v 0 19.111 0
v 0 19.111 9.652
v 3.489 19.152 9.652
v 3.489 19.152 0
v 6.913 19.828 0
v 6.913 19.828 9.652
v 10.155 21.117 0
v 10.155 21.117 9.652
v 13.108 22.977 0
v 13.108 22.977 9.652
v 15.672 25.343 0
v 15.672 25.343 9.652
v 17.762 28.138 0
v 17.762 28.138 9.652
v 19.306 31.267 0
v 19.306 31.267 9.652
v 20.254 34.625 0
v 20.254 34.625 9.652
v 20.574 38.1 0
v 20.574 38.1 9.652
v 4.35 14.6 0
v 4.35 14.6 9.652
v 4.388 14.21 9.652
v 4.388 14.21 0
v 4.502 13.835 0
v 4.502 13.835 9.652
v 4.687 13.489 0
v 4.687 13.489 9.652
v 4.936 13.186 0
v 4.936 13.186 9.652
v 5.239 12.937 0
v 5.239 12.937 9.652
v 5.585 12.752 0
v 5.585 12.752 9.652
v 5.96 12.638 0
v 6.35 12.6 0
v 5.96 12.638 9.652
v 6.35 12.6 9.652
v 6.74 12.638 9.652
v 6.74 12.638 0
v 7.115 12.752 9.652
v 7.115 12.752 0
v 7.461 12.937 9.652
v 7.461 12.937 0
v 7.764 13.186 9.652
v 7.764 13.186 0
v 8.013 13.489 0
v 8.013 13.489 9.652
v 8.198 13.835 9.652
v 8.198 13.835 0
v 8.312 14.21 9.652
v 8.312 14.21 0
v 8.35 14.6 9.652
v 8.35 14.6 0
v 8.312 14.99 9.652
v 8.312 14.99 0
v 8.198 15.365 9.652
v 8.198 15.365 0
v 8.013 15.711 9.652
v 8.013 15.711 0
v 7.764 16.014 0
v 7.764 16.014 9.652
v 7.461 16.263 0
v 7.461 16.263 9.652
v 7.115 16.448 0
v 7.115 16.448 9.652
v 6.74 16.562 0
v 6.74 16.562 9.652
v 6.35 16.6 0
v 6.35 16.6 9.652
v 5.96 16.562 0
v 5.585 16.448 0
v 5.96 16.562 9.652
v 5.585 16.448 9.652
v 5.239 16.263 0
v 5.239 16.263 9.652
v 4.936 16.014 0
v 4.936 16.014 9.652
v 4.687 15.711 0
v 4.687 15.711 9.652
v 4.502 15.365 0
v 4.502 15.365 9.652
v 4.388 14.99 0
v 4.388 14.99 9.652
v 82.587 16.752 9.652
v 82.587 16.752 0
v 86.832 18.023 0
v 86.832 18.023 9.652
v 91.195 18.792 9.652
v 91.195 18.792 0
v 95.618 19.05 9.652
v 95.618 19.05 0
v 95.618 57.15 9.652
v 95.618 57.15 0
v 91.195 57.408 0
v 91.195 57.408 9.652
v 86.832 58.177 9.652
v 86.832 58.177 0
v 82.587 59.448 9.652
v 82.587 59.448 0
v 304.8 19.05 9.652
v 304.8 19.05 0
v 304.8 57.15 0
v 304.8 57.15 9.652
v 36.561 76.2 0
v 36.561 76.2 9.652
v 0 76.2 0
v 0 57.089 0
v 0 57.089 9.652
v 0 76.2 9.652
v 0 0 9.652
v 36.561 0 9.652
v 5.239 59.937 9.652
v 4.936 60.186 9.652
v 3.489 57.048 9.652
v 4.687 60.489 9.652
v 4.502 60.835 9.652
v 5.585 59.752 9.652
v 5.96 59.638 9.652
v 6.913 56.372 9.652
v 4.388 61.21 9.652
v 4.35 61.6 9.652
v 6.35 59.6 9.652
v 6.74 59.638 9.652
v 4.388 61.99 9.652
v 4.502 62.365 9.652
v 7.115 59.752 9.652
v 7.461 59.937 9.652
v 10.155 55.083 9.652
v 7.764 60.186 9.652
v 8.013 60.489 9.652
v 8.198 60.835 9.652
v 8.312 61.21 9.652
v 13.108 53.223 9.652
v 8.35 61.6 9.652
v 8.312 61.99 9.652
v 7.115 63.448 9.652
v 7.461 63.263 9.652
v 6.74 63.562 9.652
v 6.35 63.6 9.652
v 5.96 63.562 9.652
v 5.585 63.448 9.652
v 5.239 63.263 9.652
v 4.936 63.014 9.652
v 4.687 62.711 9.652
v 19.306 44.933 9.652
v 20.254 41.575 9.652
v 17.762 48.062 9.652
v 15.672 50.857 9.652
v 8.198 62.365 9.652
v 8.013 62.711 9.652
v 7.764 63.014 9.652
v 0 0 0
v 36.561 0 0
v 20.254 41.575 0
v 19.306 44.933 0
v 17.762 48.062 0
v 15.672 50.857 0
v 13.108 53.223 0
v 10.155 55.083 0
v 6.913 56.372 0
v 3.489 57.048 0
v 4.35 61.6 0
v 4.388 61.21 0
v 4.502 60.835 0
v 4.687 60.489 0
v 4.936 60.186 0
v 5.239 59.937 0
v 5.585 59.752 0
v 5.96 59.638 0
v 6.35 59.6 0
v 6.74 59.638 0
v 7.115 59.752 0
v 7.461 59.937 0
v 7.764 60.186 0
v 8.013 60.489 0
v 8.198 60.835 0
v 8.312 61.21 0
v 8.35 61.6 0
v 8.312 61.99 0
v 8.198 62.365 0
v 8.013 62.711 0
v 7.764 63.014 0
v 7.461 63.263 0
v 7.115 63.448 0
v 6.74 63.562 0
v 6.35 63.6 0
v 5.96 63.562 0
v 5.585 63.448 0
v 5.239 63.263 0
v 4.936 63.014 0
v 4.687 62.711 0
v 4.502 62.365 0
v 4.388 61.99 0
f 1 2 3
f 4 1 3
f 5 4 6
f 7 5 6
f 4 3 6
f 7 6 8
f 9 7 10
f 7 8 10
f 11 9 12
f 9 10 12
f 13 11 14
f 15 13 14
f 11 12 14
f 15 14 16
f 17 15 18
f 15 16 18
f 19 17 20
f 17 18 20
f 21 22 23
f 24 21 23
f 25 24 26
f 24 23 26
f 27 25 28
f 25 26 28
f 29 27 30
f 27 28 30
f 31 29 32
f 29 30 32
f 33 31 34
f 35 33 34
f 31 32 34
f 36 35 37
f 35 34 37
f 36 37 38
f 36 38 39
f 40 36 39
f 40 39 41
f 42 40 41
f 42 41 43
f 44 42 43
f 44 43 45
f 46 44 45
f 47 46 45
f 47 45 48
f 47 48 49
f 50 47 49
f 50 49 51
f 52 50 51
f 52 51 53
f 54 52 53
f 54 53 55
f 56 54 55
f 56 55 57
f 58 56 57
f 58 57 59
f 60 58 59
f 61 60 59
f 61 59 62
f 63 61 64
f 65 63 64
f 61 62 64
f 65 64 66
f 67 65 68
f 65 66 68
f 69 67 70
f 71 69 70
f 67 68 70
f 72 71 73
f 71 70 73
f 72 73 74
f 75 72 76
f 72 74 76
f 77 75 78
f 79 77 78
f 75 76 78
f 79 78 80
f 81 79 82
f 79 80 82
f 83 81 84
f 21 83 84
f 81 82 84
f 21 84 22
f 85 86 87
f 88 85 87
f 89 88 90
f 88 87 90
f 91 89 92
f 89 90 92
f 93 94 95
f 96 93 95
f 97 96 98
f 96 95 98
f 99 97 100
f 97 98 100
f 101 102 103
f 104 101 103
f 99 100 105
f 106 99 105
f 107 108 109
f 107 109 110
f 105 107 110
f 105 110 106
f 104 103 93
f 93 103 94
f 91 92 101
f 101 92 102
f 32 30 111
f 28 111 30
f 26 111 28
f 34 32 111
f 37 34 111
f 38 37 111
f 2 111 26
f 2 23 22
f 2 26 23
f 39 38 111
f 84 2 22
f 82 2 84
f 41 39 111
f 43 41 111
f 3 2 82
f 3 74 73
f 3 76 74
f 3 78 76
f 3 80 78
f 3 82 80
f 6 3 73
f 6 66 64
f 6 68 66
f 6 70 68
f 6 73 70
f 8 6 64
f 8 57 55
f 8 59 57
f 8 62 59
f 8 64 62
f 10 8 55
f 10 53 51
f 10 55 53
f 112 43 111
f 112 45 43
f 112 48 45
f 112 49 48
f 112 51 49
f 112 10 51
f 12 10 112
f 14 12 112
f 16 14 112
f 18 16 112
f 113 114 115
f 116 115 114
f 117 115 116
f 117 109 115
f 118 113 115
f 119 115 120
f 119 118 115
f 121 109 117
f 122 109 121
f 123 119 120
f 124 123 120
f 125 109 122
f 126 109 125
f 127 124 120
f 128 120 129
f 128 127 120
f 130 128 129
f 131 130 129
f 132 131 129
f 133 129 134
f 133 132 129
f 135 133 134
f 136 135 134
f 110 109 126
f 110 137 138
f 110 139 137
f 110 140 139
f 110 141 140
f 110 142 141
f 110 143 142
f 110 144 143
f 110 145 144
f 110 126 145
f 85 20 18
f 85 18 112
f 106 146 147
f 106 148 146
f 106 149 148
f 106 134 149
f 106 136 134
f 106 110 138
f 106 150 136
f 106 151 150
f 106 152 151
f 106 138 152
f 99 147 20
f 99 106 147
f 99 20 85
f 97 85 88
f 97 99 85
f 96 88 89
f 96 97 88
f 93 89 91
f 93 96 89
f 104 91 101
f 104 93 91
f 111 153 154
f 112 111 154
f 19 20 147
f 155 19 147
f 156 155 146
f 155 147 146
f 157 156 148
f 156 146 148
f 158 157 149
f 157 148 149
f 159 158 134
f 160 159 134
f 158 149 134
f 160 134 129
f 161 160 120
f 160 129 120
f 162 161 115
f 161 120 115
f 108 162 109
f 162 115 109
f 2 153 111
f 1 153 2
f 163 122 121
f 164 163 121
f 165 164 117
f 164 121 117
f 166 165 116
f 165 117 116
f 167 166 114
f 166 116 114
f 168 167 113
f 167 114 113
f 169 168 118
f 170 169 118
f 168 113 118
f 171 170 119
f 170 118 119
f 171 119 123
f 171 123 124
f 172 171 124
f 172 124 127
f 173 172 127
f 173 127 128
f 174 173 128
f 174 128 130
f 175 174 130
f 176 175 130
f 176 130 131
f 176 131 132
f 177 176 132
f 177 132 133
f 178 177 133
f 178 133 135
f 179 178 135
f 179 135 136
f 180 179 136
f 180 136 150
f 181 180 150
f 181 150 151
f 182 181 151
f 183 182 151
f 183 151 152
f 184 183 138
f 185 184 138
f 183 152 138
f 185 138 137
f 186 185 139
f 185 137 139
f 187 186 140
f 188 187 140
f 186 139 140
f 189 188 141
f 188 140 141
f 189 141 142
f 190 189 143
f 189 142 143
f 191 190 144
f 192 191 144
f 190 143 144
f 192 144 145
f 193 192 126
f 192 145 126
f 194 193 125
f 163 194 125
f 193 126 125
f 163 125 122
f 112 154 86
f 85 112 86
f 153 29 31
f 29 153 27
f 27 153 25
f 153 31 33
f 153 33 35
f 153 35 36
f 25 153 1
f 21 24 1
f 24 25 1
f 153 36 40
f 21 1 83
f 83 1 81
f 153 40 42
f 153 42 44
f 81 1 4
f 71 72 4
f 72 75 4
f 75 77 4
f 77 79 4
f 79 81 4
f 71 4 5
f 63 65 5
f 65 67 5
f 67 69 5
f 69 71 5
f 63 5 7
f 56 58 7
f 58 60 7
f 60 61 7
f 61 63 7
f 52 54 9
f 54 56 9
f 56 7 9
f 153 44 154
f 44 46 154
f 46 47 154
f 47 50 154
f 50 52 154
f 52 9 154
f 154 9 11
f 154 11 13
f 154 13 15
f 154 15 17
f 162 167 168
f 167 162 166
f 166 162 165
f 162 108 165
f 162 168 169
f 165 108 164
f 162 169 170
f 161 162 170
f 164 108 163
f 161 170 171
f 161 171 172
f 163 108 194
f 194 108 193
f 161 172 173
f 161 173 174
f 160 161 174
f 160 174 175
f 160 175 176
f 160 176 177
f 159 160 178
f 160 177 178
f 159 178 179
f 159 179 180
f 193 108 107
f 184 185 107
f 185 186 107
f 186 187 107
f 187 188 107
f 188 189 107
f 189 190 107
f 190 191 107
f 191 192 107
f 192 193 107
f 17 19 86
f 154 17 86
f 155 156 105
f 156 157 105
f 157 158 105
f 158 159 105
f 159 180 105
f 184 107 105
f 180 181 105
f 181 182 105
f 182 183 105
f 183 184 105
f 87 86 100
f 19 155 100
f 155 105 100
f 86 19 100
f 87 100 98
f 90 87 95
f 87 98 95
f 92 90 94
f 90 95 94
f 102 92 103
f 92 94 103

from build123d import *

# Parameters (mm, degrees)
F0_W     = 304.8
F0_H     = 76.2
F1_DEPTH = 9.652
F3_DEPTH = 9.653
F5_DEPTH = 25.4
F7_D     = 4


with BuildPart() as f1:
    # F0 (on Top) → F1 (new body)
    with BuildSketch(Plane.XY):
        with Locations((152.4, 38.1)):
            Rectangle(F0_W, F0_H)
    extrude(amount=F1_DEPTH)

    # F2 (on face) → F3 (cut, through all)
    with BuildSketch(Plane.XY.offset(9.652)):
        with BuildLine():
            ThreePointArc((0, 19.111058), (14.444339, 24.101166), (20.574, 38.1))
            ThreePointArc((20.574, 38.1), (14.444339, 52.098834), (0, 57.088942))
            Line((0, 57.088942), (0, 19.111058))
        make_face()
    extrude(amount=-F3_DEPTH, mode=Mode.SUBTRACT)

    # F4 (on face) → F5 (cut)
    with BuildSketch(Plane(origin=(0, 0, 0), x_dir=(1, 0, 0), z_dir=(0, 0, -1))):
        with BuildLine():
            Line((304.8, 0), (36.560555, 0))
            Line((36.560555, 0), (82.587091, -16.752289))
            ThreePointArc((82.587091, -16.752289), (89.002062, -18.471175), (95.618058, -19.05))
            Line((95.618058, -19.05), (304.8, -19.05))
            Line((304.8, -19.05), (304.8, 0))
        make_face()
        with BuildLine():
            Line((304.8, -76.2), (304.8, -57.15))
            Line((304.8, -57.15), (95.618058, -57.15))
            ThreePointArc((95.618058, -57.15), (89.002062, -57.728825), (82.587091, -59.447711))
            Line((82.587091, -59.447711), (36.560555, -76.2))
            Line((36.560555, -76.2), (304.8, -76.2))
        make_face()
    extrude(amount=-F5_DEPTH, mode=Mode.SUBTRACT)

    # F7 (through all)
    with Locations(Plane(origin=(0, 0, 0), x_dir=(1, 0, 0), z_dir=(0, 0, -1))):
        with Locations((6.35, -14.6), (6.35, -61.6)):
            Hole(F7_D / 2)


solid = f1.part
